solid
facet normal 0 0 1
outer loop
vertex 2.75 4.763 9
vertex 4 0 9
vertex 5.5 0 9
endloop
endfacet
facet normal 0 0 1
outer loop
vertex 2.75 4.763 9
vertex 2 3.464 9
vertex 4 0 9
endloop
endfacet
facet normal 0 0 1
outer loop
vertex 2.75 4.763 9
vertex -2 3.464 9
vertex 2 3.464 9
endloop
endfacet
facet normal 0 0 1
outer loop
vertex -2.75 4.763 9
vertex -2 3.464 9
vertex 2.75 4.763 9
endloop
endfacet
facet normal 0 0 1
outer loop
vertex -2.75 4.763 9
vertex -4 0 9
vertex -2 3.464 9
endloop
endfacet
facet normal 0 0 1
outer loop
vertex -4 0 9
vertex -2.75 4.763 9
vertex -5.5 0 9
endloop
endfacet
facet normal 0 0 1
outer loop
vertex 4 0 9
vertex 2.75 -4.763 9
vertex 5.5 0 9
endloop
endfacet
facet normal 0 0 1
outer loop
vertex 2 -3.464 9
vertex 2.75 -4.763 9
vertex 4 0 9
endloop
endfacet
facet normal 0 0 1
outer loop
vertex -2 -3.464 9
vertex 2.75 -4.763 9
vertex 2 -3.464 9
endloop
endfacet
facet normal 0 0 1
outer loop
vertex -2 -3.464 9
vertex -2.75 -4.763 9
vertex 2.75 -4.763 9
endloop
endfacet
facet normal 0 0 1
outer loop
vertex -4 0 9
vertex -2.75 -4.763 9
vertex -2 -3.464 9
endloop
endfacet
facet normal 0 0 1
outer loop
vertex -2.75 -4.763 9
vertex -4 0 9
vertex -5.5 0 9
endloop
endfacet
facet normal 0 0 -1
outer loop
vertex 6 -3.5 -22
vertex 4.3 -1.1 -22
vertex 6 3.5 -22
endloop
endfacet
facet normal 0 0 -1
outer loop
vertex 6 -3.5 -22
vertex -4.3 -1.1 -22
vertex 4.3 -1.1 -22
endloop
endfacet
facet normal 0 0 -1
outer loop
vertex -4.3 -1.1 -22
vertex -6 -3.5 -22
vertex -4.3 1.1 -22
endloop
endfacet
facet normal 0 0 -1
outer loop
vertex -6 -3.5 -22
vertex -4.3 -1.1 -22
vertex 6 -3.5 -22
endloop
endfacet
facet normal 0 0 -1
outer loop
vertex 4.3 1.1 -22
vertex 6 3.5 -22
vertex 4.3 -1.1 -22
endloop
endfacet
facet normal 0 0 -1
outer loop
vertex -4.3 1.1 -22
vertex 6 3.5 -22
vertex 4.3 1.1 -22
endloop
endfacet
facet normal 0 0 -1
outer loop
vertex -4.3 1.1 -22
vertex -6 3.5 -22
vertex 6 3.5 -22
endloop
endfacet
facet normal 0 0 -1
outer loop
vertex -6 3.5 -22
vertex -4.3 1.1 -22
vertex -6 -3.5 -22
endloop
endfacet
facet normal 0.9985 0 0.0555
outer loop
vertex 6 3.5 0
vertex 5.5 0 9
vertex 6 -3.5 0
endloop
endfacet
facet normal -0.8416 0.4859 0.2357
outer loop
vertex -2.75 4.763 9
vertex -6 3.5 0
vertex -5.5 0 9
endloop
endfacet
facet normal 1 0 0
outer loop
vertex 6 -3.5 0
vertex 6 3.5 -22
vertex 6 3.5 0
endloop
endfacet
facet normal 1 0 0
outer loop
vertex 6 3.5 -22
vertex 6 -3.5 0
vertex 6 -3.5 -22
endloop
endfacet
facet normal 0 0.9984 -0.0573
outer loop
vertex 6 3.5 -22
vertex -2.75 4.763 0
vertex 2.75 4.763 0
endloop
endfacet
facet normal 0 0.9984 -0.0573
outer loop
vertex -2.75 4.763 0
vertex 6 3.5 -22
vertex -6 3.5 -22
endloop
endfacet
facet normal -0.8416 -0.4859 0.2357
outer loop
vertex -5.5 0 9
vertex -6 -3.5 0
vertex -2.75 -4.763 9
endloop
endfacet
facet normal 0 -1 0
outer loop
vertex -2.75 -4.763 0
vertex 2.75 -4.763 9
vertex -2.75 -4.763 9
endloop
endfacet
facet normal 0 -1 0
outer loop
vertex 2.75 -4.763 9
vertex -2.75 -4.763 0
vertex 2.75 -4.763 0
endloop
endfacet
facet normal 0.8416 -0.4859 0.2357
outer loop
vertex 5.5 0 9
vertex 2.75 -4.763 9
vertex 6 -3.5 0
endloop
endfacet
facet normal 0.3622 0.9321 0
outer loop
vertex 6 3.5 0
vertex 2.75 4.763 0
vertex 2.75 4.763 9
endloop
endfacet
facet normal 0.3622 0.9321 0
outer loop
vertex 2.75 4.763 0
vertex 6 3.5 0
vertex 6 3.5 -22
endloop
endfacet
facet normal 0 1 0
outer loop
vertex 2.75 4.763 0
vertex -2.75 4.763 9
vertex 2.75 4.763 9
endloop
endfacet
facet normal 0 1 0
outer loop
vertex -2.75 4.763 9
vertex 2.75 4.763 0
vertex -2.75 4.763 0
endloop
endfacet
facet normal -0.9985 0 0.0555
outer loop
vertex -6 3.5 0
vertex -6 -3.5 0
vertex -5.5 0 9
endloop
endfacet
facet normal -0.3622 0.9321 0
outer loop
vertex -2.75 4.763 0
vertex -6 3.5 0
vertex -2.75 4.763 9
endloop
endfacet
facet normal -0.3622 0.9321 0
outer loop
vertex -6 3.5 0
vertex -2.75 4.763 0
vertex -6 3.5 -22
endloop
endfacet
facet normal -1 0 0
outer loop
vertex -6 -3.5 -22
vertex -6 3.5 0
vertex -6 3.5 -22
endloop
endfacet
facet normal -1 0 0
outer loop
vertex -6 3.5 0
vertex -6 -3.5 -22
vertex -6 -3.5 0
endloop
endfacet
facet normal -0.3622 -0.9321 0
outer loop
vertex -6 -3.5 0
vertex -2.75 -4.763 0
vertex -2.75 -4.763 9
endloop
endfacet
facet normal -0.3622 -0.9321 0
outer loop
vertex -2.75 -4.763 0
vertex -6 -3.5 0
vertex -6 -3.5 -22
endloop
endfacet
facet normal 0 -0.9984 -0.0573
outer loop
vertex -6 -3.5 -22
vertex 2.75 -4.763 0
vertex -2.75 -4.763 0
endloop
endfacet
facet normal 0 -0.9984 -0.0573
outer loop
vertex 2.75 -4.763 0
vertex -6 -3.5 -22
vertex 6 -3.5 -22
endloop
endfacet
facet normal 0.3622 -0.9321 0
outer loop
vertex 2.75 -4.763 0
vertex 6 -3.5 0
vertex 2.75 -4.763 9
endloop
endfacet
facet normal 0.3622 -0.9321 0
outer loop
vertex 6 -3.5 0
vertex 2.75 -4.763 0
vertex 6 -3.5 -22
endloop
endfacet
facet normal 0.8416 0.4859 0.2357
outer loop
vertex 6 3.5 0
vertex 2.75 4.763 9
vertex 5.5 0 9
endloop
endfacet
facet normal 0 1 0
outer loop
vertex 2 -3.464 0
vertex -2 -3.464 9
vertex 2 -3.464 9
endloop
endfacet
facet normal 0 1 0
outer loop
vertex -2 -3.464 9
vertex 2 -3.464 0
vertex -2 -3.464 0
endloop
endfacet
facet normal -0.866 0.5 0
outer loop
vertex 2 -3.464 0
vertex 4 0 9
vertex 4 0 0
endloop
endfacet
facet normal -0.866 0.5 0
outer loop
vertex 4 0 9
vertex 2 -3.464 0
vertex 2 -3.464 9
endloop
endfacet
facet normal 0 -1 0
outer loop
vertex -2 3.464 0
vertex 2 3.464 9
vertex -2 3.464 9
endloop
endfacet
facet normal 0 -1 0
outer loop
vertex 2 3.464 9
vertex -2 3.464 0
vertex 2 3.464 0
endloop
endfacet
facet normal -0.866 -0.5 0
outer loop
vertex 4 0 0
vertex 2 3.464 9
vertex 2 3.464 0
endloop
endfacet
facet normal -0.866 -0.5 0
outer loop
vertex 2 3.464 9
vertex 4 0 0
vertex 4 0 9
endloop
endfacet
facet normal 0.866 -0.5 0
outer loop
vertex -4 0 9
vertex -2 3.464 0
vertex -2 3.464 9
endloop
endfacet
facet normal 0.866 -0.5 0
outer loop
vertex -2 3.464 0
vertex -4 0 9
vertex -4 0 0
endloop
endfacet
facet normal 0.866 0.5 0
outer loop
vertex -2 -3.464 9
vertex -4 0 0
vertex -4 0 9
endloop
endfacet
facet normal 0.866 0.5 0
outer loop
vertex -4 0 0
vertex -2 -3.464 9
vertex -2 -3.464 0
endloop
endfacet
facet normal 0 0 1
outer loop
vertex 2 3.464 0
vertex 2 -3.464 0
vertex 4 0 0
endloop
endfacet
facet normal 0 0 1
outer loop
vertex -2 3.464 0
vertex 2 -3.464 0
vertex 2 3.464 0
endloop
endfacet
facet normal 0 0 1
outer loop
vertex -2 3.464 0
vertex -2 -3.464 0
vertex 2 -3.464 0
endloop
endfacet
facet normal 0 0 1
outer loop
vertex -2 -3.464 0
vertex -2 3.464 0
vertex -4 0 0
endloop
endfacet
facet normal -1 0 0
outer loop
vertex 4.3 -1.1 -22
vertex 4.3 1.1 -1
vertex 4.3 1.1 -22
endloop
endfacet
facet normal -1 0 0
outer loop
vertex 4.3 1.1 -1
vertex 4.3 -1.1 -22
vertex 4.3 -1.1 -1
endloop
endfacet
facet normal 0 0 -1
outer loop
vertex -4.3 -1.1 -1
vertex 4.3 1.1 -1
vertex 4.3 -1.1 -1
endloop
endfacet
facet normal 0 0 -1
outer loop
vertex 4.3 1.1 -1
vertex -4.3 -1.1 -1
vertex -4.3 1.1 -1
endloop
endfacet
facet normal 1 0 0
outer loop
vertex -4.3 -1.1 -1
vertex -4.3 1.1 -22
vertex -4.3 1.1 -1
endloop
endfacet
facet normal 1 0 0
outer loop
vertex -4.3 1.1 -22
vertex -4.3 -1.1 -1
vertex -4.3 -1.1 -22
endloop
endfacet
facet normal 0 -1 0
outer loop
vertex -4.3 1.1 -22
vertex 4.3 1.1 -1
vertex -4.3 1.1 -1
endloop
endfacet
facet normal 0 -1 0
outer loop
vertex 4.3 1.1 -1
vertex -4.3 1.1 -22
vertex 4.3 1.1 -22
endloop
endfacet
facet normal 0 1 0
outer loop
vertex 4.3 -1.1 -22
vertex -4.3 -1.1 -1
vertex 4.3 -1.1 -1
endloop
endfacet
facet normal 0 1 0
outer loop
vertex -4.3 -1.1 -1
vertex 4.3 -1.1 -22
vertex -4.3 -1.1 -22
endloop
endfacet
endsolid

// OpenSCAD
//Victorinox hex bit adapter
external_x = 12;
external_y = 7;
external_h = 22;

slot_x = 8.6;
slot_y = 2.2;
slot_h = 21;

difference() {
hull() {
cylinder($fn=6, d=11, h=9);
translate([-0.5*external_x, -0.5*external_y, -external_h]) cube([external_x, external_y, external_h]);
}

cylinder($fn=6, d=8, h=9);
translate([-0.5*slot_x, -0.5*slot_y, -slot_h-(external_h-slot_h)]) cube([slot_x, slot_y, slot_h]);
}
